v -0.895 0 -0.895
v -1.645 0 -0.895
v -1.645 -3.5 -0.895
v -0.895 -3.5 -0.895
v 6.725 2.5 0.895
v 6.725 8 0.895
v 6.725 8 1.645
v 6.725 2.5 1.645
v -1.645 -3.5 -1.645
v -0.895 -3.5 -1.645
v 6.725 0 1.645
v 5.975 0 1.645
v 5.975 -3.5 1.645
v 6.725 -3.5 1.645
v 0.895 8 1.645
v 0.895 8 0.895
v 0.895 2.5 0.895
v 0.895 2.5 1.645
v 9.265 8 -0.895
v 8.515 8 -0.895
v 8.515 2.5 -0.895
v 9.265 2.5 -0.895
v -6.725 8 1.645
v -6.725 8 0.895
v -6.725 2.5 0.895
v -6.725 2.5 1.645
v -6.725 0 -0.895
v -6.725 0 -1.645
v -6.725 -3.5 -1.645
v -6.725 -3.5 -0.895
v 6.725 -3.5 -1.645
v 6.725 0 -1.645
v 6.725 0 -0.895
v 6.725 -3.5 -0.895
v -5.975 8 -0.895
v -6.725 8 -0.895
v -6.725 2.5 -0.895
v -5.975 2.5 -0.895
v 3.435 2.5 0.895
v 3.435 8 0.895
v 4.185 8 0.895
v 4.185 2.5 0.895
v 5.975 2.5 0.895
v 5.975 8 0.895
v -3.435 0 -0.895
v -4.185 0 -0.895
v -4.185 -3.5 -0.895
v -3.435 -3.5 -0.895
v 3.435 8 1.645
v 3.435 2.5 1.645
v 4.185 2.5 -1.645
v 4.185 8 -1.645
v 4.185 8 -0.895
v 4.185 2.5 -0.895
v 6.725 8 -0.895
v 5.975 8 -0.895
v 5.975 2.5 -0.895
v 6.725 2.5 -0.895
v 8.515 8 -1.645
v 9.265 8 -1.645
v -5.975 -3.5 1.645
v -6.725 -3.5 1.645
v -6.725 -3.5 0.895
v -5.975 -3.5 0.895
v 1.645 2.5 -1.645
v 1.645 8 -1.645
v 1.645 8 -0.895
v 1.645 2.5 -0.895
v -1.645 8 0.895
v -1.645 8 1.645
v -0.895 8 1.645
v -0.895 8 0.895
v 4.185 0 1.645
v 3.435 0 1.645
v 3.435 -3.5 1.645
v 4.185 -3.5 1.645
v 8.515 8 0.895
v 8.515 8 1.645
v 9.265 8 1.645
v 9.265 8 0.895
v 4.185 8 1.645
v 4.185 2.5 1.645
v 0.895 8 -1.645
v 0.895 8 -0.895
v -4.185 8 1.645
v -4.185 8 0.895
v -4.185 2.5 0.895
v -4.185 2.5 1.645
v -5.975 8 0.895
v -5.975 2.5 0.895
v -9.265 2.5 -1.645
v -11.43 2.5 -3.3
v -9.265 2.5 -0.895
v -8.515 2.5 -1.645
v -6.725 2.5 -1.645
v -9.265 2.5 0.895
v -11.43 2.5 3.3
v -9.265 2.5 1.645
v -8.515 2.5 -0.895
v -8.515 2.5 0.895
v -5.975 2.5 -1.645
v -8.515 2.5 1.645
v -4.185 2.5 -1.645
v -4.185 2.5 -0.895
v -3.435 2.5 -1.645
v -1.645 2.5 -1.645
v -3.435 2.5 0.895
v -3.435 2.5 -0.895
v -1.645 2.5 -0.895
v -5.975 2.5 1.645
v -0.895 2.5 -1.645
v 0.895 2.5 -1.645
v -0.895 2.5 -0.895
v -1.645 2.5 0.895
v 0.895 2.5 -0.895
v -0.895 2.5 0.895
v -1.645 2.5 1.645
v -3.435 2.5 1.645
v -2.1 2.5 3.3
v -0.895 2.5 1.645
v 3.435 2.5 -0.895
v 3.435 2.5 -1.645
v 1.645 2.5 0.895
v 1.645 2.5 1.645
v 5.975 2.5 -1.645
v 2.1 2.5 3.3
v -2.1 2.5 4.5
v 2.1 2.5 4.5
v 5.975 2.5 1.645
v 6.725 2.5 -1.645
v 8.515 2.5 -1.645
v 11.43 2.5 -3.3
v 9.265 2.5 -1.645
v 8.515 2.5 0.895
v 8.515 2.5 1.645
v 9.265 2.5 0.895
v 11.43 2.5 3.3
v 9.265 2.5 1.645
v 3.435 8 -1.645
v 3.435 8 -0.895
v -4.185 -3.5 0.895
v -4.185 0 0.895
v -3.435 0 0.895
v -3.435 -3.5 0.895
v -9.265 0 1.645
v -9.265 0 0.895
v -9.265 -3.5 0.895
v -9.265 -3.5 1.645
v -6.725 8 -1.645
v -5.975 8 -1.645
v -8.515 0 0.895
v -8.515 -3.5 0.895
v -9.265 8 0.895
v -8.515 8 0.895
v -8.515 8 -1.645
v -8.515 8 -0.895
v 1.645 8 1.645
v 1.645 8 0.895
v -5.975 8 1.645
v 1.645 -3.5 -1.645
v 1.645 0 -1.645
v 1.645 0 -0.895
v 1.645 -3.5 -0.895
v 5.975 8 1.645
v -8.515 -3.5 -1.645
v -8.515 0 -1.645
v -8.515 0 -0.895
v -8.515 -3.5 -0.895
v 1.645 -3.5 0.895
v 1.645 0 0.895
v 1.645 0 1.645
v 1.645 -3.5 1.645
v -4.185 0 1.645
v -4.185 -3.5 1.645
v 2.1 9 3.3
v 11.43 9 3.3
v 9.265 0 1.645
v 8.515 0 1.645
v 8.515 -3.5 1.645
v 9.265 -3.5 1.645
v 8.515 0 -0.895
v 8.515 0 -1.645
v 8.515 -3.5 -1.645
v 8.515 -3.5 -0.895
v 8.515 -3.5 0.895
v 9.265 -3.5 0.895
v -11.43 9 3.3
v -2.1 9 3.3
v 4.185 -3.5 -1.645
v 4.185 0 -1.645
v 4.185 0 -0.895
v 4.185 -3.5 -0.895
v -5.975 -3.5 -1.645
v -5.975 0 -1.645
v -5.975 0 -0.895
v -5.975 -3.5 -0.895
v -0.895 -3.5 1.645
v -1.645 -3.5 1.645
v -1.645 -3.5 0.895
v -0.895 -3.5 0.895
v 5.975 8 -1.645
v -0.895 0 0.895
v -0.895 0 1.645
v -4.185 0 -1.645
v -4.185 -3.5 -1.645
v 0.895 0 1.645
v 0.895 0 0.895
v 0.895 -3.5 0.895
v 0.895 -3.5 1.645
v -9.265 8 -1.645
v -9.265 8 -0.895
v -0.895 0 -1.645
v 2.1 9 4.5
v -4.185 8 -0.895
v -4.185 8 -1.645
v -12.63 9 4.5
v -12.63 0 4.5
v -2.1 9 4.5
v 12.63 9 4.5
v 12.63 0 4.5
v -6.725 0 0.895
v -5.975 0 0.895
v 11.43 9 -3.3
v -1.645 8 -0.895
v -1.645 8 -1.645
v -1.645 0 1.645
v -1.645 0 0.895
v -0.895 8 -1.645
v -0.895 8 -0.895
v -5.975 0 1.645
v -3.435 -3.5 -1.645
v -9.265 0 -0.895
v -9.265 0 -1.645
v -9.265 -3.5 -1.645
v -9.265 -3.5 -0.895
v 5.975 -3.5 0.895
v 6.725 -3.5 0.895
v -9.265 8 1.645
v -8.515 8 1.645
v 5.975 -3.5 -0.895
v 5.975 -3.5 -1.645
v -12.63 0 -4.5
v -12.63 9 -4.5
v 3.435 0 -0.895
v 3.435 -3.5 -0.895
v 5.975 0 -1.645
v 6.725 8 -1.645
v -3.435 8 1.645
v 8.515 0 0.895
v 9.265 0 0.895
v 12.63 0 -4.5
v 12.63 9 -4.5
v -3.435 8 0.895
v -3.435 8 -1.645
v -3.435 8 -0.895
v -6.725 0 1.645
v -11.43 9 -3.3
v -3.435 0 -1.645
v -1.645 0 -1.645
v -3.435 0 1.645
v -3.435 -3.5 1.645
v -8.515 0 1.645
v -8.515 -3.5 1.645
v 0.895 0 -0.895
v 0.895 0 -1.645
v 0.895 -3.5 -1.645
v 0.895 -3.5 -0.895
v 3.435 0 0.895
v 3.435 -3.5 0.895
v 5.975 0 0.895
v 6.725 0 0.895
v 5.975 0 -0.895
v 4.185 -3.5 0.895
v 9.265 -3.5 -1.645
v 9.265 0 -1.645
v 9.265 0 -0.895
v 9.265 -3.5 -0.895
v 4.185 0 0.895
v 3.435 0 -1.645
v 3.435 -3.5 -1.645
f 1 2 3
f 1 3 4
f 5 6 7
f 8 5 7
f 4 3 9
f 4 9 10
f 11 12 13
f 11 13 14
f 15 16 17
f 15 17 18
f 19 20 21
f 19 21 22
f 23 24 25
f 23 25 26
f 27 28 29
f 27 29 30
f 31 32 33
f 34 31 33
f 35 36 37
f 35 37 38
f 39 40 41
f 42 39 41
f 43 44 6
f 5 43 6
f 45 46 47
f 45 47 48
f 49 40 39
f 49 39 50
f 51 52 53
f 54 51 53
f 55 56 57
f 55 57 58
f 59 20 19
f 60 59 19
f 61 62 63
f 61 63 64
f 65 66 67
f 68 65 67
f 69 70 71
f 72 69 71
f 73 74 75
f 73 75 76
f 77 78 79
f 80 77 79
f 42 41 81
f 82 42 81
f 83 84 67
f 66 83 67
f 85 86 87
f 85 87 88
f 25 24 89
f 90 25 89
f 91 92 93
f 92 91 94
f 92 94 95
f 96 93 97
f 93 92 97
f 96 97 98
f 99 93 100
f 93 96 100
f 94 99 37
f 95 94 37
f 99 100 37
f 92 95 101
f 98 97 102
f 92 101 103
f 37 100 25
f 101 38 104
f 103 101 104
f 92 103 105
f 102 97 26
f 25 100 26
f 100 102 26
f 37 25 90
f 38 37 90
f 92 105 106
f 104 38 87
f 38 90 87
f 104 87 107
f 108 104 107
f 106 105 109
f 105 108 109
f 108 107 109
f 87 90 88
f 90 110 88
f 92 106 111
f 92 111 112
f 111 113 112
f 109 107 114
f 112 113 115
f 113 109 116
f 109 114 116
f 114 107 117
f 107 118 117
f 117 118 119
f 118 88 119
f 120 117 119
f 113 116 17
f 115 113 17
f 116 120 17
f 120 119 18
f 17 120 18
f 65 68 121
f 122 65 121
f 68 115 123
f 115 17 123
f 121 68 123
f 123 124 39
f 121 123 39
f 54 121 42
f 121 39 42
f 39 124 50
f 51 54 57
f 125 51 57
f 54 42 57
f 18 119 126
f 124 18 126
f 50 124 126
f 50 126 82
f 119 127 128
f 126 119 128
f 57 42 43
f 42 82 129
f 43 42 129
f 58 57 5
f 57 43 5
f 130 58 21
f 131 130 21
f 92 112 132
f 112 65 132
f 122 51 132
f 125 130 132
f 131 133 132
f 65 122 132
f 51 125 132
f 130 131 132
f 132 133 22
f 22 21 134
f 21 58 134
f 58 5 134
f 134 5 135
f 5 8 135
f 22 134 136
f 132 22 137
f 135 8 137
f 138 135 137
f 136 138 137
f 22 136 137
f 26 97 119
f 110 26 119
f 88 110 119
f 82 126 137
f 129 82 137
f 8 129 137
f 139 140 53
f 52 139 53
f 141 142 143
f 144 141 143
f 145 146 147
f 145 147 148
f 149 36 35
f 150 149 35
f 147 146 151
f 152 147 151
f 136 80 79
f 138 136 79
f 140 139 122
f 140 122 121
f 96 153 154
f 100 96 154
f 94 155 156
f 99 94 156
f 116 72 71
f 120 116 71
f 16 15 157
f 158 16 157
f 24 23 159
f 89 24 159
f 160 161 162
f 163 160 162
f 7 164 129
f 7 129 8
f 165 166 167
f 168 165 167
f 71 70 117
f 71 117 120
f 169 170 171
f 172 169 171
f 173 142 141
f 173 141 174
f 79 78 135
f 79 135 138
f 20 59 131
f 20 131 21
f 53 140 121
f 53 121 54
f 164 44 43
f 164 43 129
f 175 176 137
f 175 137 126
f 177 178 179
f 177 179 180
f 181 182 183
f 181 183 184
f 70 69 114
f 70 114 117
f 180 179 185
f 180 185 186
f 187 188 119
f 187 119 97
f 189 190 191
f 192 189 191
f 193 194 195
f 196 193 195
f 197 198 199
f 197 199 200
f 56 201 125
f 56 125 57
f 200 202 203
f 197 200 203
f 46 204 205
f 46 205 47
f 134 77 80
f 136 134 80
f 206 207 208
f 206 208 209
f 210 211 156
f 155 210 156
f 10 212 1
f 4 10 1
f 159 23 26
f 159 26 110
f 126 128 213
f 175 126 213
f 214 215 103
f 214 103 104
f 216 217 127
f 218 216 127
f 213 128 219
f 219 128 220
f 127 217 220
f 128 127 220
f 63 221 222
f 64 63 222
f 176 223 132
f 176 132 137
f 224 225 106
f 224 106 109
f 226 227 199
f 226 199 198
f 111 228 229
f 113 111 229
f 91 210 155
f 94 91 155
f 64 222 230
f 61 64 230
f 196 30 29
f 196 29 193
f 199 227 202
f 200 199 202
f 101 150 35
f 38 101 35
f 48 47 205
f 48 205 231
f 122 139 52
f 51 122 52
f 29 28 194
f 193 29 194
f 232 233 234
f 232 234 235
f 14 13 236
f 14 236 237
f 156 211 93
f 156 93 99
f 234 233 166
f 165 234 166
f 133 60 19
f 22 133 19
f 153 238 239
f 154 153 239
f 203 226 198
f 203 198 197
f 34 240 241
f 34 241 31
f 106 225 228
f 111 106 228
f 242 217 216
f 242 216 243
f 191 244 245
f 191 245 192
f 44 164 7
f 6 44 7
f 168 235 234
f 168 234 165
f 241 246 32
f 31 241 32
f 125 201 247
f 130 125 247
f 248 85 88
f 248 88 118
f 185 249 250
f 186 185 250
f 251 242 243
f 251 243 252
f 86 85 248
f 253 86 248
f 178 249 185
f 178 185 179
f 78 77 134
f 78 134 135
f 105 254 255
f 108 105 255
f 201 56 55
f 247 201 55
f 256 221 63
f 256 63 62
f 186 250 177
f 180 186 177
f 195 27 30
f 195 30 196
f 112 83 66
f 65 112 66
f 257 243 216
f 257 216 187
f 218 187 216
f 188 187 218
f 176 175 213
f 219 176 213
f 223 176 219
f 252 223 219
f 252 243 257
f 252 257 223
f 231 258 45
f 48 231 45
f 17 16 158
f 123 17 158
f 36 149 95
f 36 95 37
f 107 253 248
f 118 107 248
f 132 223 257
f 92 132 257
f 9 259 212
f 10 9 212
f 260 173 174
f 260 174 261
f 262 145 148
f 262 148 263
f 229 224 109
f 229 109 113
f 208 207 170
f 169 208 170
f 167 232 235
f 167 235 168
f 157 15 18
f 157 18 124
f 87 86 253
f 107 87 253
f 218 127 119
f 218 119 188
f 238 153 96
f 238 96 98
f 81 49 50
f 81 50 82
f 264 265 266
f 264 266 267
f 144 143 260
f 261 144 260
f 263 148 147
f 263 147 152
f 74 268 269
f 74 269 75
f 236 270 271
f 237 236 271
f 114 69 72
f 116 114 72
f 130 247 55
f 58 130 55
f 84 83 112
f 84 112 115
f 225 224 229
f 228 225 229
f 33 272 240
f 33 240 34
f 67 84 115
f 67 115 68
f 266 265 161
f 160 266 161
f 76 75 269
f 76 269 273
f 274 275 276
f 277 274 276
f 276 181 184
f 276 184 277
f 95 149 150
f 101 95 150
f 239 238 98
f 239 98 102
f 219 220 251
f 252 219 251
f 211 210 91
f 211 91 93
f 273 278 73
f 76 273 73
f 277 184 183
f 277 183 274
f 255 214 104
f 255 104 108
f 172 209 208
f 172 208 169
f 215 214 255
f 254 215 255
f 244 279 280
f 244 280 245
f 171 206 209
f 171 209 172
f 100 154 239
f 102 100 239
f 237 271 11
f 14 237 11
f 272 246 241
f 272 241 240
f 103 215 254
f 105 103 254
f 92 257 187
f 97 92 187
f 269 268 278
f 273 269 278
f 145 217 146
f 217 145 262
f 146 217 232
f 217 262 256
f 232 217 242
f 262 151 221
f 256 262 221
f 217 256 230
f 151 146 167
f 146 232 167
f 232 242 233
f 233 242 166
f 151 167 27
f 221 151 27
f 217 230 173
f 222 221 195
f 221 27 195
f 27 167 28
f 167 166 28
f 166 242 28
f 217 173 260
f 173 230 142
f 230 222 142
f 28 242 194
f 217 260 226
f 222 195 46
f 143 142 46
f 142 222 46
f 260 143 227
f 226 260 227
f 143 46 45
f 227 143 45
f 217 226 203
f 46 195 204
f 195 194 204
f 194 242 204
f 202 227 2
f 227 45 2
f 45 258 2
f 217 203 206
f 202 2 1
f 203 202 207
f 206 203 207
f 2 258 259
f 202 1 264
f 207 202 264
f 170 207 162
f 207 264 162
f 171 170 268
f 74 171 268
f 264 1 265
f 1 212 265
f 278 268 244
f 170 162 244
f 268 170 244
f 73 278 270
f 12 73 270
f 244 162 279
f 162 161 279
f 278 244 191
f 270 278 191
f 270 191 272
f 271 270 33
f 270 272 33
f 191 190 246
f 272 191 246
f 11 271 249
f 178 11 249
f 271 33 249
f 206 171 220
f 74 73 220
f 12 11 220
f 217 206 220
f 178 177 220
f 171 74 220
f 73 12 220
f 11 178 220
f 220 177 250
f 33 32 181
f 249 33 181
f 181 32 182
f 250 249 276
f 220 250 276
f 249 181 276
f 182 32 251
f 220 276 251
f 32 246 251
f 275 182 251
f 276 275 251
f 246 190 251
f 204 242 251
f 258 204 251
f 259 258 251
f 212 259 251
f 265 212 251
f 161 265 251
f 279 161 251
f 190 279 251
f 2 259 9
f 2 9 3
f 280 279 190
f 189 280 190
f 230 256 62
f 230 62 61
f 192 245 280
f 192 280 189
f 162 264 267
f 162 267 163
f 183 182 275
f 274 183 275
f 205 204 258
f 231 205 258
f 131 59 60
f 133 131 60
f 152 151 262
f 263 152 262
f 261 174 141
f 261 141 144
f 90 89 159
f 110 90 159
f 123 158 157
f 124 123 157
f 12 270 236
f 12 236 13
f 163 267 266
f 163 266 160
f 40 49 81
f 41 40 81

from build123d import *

# Parameters (mm, degrees)
SKETCH_1_W           = 25.26
SKETCH_1_H           = 9
EXTRUDE_1_DEPTH      = 9
SKETCH_2_W           = 22.86
SKETCH_2_H           = 6.6
CUT_EXTRUDE_1_DEPTH  = 6.5
SKETCH_3_W           = 4.2
SKETCH_3_H           = 6.5
CUT_EXTRUDE_2_DEPTH  = 6.5
EXTRUDE_2_DEPTH      = 3.5
EXTRUDE_2_DEPTH_BACK = 8
SKETCH_5_W           = 0.75
SKETCH_5_H           = 0.75


with BuildPart() as part:
    # 草图1 → 拉伸1 (new body)
    with BuildSketch(Plane(origin=(0, 0, 0), x_dir=(1, 0, 0), z_dir=(0, 1, 0))):
        Rectangle(SKETCH_1_W, SKETCH_1_H)
    extrude(amount=EXTRUDE_1_DEPTH)

    # 草图2 → 切除-拉伸1 (cut)
    with BuildSketch(Plane(origin=(0, 9, 0), x_dir=(-1, 0, 0), z_dir=(0, 1, 0))):
        Rectangle(SKETCH_2_W, SKETCH_2_H)
    extrude(amount=-CUT_EXTRUDE_1_DEPTH, mode=Mode.SUBTRACT)

    # 草图3 → 切除-拉伸2 (cut)
    with BuildSketch(Plane.XY.offset(4.5)):
        with Locations((0, 5.75)):
            Rectangle(SKETCH_3_W, SKETCH_3_H)
    extrude(amount=-CUT_EXTRUDE_2_DEPTH, mode=Mode.SUBTRACT)

    # 草图5 → 拉伸2 (add, two sides: drawn at the far end of the back side and taken through both)
    with BuildSketch(Plane.XZ.offset(-EXTRUDE_2_DEPTH_BACK)):
        with Locations((-1.27, 1.27)):
            Rectangle(SKETCH_5_W, SKETCH_5_H)
        with Locations((-3.81, 1.27)):
            Rectangle(SKETCH_5_W, SKETCH_5_H)
        with Locations((-6.35, 1.27)):
            Rectangle(SKETCH_5_W, SKETCH_5_H)
        with Locations((-8.89, 1.27)):
            Rectangle(SKETCH_5_W, SKETCH_5_H)
        with Locations((-8.89, -1.27)):
            Rectangle(SKETCH_5_W, SKETCH_5_H)
        with Locations((-6.35, -1.27)):
            Rectangle(SKETCH_5_W, SKETCH_5_H)
        with Locations((-3.81, -1.27)):
            Rectangle(SKETCH_5_W, SKETCH_5_H)
        with Locations((-1.27, -1.27)):
            Rectangle(SKETCH_5_W, SKETCH_5_H)
        with Locations((1.27, -1.27)):
            Rectangle(SKETCH_5_W, SKETCH_5_H)
        with Locations((3.81, -1.27)):
            Rectangle(SKETCH_5_W, SKETCH_5_H)
        with Locations((6.35, -1.27)):
            Rectangle(SKETCH_5_W, SKETCH_5_H)
        with Locations((8.89, -1.27)):
            Rectangle(SKETCH_5_W, SKETCH_5_H)
        with Locations((8.89, 1.27)):
            Rectangle(SKETCH_5_W, SKETCH_5_H)
        with Locations((6.35, 1.27)):
            Rectangle(SKETCH_5_W, SKETCH_5_H)
        with Locations((3.81, 1.27)):
            Rectangle(SKETCH_5_W, SKETCH_5_H)
        with Locations((1.27, 1.27)):
            Rectangle(SKETCH_5_W, SKETCH_5_H)
    extrude(amount=EXTRUDE_2_DEPTH + EXTRUDE_2_DEPTH_BACK)


solid = part.part
